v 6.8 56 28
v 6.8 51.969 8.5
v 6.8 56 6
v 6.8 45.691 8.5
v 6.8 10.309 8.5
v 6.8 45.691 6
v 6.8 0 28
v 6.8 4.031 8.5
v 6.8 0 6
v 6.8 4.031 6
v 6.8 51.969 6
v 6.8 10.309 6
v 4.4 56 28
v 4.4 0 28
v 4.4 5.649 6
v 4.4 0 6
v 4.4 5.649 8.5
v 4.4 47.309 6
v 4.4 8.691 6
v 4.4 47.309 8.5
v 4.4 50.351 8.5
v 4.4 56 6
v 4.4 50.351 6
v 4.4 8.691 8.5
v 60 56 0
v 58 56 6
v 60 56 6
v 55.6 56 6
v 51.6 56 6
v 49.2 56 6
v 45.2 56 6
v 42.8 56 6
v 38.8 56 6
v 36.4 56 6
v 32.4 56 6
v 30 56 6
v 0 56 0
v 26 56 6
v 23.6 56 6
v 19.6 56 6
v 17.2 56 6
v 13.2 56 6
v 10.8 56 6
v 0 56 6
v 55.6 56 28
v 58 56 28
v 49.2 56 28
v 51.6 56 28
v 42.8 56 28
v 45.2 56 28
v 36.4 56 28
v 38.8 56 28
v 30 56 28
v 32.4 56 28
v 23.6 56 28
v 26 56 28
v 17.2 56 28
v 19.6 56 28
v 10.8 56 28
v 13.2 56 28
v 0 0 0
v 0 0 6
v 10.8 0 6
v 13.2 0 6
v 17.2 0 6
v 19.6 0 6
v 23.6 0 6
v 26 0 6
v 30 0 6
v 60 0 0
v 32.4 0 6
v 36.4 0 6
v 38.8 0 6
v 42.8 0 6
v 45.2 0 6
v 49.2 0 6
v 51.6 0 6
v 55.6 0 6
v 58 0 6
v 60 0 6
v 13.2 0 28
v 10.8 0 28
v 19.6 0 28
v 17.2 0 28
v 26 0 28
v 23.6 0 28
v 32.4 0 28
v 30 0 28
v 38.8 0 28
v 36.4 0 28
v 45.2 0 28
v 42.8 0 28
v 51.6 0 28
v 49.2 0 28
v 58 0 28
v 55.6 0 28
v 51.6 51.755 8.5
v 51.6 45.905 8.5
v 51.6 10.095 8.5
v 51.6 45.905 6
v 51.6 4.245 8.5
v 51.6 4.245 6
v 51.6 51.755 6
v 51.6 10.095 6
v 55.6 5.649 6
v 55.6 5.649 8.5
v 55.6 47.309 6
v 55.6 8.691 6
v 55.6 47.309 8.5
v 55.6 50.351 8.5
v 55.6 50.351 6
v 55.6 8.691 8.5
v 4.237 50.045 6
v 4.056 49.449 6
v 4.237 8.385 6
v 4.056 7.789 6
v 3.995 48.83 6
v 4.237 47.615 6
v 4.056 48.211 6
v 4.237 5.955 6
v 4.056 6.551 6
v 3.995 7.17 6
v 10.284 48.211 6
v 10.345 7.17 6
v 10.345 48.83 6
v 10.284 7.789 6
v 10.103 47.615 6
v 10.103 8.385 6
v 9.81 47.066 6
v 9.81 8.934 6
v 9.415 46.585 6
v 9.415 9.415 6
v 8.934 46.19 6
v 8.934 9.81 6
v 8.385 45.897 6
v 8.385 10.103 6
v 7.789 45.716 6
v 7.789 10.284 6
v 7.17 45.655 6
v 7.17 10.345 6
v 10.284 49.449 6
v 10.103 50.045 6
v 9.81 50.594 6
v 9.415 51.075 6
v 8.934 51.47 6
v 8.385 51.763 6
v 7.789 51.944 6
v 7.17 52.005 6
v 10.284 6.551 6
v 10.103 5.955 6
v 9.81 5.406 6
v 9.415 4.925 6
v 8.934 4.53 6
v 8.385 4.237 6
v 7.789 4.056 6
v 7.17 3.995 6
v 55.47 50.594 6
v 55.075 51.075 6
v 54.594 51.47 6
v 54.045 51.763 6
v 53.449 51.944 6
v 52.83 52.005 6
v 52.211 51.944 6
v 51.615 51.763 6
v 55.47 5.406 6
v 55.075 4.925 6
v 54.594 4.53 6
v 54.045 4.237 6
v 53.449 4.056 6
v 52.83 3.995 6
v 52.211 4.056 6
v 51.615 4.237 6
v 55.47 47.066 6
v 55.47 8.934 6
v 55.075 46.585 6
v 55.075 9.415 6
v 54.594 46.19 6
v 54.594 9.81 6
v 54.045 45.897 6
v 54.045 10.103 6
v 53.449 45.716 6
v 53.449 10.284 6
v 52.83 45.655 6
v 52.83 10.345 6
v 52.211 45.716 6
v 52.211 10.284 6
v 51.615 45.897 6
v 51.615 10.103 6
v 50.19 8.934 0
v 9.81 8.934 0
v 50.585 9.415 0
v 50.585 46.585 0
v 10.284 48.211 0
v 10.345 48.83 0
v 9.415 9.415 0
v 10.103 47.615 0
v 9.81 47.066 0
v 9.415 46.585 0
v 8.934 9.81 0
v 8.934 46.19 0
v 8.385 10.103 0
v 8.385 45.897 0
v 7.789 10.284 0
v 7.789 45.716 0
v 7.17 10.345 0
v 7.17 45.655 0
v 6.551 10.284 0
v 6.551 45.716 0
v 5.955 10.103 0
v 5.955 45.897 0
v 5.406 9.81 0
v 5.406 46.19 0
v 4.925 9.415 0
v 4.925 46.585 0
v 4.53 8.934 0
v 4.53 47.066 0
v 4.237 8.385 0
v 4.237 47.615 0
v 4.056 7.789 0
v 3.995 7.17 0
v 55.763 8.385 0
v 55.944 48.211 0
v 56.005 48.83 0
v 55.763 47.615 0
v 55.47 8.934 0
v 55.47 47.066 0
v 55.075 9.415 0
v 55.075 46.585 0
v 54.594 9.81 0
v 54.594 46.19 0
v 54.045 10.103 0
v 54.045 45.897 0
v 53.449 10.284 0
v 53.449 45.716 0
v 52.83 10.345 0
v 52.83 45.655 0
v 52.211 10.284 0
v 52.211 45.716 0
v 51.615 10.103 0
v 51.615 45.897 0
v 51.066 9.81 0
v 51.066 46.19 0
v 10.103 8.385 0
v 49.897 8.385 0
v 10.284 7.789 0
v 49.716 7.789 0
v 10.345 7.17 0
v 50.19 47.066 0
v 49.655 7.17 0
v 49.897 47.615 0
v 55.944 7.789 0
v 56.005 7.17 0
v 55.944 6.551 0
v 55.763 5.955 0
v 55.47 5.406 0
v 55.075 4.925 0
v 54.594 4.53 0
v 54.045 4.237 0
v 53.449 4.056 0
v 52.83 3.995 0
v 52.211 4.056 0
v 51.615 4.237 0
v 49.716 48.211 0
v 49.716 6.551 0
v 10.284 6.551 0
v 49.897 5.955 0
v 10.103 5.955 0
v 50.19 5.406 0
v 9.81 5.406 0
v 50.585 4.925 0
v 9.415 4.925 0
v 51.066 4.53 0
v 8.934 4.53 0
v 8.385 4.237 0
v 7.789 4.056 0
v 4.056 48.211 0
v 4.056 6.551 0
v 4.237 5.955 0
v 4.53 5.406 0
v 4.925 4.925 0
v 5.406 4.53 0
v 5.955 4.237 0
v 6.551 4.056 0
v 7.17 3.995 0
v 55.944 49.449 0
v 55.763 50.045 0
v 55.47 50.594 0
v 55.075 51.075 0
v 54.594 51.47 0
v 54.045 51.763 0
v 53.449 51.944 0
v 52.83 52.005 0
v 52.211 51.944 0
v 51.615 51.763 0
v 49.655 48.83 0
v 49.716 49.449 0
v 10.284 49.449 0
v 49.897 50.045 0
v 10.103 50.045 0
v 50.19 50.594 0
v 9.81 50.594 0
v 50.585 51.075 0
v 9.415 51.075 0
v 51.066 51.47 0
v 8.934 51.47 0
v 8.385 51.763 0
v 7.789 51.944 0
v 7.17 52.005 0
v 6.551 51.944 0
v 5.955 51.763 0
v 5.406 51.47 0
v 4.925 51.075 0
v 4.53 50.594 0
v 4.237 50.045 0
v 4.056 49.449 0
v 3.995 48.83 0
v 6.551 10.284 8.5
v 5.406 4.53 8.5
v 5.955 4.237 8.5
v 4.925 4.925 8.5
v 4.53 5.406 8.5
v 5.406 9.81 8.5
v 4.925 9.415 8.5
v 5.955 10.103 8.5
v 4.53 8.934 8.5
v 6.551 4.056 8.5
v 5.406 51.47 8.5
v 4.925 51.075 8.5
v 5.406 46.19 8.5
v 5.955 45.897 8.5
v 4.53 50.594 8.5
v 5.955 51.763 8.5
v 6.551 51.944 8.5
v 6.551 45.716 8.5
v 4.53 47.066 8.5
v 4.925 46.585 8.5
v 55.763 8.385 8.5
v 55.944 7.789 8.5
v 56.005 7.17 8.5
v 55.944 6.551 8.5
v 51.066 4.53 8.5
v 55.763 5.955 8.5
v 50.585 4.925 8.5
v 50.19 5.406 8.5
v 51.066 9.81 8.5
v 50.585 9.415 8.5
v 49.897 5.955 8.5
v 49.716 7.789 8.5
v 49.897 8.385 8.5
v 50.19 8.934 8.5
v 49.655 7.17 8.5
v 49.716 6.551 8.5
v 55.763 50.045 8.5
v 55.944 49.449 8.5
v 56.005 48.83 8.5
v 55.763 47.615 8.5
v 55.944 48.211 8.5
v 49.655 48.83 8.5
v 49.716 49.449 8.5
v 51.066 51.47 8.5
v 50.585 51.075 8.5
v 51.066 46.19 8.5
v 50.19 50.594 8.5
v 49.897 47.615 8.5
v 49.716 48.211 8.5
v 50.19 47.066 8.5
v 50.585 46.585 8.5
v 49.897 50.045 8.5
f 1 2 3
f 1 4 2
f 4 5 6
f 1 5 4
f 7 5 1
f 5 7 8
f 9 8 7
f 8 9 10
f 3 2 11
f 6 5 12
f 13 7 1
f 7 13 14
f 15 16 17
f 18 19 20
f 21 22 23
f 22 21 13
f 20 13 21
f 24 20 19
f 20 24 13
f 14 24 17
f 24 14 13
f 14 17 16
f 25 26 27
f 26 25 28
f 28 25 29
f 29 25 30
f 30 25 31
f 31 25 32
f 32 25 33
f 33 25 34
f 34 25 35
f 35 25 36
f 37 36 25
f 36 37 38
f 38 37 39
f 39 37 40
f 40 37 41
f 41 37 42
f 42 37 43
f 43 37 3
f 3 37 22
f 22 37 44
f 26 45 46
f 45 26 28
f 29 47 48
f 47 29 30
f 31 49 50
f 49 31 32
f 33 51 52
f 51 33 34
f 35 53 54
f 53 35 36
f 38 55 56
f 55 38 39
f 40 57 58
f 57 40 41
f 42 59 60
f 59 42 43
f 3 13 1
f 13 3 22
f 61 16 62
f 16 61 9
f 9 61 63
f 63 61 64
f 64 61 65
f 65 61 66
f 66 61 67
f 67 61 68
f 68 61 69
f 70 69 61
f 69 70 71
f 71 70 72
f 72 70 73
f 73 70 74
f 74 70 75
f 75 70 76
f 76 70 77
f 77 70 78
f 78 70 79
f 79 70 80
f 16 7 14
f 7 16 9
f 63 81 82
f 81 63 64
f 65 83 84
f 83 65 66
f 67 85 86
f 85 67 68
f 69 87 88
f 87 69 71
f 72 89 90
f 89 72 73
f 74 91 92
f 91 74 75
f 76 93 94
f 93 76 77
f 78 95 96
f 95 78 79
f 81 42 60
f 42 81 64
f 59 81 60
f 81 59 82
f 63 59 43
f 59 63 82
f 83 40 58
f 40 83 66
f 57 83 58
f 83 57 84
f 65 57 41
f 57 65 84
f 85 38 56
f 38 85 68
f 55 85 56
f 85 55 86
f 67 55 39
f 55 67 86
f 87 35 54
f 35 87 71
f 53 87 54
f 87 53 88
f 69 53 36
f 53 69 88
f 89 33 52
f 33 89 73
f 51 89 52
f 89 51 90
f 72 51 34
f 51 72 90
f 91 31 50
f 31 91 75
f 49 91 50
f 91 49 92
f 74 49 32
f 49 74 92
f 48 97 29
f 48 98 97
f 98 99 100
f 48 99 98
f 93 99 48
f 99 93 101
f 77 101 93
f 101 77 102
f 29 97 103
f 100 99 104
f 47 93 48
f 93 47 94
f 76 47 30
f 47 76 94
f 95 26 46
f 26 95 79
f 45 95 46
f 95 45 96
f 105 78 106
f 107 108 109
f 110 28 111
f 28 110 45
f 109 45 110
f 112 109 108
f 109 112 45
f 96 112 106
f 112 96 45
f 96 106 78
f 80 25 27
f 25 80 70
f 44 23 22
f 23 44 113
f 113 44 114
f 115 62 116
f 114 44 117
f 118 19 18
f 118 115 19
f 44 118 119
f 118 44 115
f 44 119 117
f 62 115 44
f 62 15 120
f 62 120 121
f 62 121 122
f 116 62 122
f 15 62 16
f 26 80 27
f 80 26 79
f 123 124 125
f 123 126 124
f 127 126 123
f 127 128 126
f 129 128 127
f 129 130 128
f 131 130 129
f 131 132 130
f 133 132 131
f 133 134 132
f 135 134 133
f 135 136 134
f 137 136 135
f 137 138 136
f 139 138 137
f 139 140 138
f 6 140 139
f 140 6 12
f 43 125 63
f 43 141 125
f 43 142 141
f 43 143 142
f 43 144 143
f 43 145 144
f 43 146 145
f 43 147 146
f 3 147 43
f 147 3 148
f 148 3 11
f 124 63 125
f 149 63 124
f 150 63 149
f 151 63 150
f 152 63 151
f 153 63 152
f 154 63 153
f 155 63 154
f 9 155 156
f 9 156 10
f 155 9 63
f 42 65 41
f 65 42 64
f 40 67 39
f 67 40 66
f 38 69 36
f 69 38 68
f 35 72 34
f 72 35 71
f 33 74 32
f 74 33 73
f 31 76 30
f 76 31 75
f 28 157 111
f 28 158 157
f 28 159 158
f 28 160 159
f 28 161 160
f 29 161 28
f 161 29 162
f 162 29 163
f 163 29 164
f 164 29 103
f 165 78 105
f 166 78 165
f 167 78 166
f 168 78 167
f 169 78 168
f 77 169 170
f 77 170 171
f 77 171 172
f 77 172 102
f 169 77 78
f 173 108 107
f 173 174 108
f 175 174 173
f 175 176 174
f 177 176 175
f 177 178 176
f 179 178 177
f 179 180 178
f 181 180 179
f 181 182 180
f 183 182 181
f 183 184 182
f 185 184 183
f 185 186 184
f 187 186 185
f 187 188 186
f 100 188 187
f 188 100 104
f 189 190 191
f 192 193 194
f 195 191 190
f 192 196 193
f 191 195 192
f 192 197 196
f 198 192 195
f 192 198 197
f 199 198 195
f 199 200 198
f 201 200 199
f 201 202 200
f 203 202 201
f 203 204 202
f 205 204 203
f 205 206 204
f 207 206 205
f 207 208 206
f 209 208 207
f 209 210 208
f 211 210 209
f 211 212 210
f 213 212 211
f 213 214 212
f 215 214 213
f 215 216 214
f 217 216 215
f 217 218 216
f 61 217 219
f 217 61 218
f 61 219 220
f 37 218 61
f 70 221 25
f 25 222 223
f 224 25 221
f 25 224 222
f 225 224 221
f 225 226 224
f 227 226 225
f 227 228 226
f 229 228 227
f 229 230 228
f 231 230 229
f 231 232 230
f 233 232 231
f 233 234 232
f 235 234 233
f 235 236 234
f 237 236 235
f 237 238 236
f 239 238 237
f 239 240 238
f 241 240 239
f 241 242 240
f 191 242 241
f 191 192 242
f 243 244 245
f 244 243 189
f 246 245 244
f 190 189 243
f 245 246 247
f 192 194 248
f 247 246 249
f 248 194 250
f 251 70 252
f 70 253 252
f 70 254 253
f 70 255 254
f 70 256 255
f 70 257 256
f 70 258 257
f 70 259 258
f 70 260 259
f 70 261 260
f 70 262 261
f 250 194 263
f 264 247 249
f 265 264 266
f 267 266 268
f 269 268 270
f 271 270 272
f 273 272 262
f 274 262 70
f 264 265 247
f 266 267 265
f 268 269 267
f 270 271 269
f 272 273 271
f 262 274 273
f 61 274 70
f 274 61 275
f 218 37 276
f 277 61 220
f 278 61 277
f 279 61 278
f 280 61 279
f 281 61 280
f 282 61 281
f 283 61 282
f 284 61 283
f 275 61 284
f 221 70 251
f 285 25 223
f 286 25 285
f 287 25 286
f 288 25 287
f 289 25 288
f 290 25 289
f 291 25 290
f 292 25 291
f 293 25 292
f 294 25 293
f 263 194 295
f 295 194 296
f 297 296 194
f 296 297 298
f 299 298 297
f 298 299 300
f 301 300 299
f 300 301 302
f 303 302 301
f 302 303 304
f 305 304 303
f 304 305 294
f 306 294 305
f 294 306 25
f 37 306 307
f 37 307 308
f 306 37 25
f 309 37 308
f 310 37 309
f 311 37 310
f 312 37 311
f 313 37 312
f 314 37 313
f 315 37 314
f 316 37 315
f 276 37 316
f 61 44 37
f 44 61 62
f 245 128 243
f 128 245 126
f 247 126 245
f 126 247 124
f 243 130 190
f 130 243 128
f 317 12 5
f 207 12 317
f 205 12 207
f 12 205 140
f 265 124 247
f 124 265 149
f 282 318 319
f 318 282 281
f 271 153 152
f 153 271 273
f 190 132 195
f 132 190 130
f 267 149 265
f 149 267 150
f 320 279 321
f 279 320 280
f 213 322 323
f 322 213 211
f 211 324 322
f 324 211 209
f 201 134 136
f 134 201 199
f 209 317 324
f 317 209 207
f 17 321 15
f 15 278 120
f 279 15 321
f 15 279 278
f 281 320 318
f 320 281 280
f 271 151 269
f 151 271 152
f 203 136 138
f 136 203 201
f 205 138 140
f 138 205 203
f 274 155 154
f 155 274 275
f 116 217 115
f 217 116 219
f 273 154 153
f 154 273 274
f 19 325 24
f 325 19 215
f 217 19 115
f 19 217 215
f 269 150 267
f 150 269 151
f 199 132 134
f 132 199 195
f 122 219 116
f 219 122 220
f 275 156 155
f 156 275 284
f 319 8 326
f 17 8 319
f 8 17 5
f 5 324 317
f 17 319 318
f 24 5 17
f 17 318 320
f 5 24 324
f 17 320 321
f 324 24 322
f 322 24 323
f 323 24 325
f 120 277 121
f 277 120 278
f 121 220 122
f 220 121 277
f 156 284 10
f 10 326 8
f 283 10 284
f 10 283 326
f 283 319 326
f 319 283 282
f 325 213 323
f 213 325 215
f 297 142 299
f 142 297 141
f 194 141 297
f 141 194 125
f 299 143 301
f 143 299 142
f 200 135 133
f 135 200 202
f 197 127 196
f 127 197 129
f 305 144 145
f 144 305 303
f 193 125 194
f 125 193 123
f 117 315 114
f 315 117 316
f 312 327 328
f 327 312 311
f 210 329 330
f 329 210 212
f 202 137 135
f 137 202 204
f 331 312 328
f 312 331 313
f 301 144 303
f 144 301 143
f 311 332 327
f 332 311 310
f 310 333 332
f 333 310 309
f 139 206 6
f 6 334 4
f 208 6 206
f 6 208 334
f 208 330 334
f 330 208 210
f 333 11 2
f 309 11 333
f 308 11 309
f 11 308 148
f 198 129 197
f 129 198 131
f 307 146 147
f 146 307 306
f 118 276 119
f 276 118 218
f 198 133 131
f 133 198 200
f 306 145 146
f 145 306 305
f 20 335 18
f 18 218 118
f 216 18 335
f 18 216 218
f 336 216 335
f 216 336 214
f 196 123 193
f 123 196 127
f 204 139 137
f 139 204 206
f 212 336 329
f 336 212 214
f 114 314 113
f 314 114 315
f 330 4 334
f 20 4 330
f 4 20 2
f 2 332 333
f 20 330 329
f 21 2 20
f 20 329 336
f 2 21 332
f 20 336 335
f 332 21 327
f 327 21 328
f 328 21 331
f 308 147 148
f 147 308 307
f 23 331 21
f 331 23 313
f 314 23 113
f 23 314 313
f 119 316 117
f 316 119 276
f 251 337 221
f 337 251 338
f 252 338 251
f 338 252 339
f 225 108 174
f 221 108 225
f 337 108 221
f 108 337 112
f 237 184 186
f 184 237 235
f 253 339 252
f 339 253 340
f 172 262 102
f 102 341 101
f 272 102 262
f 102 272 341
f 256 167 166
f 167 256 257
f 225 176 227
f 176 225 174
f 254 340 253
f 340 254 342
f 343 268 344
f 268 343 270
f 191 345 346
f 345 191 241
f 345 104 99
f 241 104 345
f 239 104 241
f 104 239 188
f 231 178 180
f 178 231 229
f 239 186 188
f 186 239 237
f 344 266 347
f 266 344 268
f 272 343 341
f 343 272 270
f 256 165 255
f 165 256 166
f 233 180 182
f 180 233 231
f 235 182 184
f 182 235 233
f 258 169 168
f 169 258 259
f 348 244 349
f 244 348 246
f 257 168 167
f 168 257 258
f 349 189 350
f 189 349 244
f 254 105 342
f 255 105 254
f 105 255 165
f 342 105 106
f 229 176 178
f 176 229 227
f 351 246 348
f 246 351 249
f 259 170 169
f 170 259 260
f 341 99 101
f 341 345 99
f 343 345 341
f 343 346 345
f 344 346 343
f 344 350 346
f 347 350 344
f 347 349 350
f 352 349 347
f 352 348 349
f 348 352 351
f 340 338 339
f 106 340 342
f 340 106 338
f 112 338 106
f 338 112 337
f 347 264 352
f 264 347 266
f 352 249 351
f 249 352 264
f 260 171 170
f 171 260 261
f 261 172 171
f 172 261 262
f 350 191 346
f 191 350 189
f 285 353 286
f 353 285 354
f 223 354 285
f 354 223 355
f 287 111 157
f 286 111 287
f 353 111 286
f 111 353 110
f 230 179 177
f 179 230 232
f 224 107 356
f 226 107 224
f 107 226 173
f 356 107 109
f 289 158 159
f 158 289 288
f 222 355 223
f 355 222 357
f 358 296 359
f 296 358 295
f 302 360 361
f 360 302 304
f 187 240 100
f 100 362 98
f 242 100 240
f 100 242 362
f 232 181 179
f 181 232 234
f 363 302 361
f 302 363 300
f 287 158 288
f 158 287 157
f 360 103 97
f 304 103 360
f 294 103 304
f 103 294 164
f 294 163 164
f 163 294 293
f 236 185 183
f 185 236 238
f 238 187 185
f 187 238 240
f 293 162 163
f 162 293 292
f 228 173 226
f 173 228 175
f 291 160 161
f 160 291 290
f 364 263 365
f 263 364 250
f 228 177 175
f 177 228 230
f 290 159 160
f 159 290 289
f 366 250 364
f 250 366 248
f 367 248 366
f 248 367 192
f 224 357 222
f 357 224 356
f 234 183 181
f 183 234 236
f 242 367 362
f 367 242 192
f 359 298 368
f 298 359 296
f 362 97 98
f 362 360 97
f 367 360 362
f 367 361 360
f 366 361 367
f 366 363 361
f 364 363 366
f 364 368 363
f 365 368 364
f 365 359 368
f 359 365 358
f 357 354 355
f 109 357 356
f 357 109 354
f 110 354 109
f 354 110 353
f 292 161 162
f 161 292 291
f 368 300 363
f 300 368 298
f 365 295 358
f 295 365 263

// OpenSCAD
$fn = 32;

// ----------------------------------------------------------------------
// Finned heat sink: 60 x 56 mm base, 22 mm fins
// ----------------------------------------------------------------------

// --- parameters (mm) ---
base_w = 60;              // base width
base_d = 56;              // base depth
base_t = 6;               // base thickness
fin_h = 22;               // fin height above the base
holes_d = 6.35;           // fixing holes
hole_x = 22.83;           // hole offset in x
hole_y = 20.83;           // hole offset in y
fin_t = 2.4;              // fin thickness
fin_pitch = 6.4;          // fin pitch
fin_count = 9;            // number of fins
fin_x0 = 4.4;             // first fin offset

difference() {
  union() {
    cube([base_w, base_d, base_t]);
    for (i = [0 : fin_count - 1]) {
      translate([fin_x0 + i * fin_pitch, 0, base_t - 0.5]) cube([fin_t, base_d, fin_h + 0.5]);
    }
  }
  /* fixing holes through the base, 2.5 mm clear on both sides */
  for (hx = [-22.83, 22.83]) {
    for (hy = [-20.83, 20.83]) {
      translate([base_w / 2 + hx, base_d / 2 + hy, -2.5]) cylinder(h = base_t + 5, d = holes_d);
    }
  }
}
